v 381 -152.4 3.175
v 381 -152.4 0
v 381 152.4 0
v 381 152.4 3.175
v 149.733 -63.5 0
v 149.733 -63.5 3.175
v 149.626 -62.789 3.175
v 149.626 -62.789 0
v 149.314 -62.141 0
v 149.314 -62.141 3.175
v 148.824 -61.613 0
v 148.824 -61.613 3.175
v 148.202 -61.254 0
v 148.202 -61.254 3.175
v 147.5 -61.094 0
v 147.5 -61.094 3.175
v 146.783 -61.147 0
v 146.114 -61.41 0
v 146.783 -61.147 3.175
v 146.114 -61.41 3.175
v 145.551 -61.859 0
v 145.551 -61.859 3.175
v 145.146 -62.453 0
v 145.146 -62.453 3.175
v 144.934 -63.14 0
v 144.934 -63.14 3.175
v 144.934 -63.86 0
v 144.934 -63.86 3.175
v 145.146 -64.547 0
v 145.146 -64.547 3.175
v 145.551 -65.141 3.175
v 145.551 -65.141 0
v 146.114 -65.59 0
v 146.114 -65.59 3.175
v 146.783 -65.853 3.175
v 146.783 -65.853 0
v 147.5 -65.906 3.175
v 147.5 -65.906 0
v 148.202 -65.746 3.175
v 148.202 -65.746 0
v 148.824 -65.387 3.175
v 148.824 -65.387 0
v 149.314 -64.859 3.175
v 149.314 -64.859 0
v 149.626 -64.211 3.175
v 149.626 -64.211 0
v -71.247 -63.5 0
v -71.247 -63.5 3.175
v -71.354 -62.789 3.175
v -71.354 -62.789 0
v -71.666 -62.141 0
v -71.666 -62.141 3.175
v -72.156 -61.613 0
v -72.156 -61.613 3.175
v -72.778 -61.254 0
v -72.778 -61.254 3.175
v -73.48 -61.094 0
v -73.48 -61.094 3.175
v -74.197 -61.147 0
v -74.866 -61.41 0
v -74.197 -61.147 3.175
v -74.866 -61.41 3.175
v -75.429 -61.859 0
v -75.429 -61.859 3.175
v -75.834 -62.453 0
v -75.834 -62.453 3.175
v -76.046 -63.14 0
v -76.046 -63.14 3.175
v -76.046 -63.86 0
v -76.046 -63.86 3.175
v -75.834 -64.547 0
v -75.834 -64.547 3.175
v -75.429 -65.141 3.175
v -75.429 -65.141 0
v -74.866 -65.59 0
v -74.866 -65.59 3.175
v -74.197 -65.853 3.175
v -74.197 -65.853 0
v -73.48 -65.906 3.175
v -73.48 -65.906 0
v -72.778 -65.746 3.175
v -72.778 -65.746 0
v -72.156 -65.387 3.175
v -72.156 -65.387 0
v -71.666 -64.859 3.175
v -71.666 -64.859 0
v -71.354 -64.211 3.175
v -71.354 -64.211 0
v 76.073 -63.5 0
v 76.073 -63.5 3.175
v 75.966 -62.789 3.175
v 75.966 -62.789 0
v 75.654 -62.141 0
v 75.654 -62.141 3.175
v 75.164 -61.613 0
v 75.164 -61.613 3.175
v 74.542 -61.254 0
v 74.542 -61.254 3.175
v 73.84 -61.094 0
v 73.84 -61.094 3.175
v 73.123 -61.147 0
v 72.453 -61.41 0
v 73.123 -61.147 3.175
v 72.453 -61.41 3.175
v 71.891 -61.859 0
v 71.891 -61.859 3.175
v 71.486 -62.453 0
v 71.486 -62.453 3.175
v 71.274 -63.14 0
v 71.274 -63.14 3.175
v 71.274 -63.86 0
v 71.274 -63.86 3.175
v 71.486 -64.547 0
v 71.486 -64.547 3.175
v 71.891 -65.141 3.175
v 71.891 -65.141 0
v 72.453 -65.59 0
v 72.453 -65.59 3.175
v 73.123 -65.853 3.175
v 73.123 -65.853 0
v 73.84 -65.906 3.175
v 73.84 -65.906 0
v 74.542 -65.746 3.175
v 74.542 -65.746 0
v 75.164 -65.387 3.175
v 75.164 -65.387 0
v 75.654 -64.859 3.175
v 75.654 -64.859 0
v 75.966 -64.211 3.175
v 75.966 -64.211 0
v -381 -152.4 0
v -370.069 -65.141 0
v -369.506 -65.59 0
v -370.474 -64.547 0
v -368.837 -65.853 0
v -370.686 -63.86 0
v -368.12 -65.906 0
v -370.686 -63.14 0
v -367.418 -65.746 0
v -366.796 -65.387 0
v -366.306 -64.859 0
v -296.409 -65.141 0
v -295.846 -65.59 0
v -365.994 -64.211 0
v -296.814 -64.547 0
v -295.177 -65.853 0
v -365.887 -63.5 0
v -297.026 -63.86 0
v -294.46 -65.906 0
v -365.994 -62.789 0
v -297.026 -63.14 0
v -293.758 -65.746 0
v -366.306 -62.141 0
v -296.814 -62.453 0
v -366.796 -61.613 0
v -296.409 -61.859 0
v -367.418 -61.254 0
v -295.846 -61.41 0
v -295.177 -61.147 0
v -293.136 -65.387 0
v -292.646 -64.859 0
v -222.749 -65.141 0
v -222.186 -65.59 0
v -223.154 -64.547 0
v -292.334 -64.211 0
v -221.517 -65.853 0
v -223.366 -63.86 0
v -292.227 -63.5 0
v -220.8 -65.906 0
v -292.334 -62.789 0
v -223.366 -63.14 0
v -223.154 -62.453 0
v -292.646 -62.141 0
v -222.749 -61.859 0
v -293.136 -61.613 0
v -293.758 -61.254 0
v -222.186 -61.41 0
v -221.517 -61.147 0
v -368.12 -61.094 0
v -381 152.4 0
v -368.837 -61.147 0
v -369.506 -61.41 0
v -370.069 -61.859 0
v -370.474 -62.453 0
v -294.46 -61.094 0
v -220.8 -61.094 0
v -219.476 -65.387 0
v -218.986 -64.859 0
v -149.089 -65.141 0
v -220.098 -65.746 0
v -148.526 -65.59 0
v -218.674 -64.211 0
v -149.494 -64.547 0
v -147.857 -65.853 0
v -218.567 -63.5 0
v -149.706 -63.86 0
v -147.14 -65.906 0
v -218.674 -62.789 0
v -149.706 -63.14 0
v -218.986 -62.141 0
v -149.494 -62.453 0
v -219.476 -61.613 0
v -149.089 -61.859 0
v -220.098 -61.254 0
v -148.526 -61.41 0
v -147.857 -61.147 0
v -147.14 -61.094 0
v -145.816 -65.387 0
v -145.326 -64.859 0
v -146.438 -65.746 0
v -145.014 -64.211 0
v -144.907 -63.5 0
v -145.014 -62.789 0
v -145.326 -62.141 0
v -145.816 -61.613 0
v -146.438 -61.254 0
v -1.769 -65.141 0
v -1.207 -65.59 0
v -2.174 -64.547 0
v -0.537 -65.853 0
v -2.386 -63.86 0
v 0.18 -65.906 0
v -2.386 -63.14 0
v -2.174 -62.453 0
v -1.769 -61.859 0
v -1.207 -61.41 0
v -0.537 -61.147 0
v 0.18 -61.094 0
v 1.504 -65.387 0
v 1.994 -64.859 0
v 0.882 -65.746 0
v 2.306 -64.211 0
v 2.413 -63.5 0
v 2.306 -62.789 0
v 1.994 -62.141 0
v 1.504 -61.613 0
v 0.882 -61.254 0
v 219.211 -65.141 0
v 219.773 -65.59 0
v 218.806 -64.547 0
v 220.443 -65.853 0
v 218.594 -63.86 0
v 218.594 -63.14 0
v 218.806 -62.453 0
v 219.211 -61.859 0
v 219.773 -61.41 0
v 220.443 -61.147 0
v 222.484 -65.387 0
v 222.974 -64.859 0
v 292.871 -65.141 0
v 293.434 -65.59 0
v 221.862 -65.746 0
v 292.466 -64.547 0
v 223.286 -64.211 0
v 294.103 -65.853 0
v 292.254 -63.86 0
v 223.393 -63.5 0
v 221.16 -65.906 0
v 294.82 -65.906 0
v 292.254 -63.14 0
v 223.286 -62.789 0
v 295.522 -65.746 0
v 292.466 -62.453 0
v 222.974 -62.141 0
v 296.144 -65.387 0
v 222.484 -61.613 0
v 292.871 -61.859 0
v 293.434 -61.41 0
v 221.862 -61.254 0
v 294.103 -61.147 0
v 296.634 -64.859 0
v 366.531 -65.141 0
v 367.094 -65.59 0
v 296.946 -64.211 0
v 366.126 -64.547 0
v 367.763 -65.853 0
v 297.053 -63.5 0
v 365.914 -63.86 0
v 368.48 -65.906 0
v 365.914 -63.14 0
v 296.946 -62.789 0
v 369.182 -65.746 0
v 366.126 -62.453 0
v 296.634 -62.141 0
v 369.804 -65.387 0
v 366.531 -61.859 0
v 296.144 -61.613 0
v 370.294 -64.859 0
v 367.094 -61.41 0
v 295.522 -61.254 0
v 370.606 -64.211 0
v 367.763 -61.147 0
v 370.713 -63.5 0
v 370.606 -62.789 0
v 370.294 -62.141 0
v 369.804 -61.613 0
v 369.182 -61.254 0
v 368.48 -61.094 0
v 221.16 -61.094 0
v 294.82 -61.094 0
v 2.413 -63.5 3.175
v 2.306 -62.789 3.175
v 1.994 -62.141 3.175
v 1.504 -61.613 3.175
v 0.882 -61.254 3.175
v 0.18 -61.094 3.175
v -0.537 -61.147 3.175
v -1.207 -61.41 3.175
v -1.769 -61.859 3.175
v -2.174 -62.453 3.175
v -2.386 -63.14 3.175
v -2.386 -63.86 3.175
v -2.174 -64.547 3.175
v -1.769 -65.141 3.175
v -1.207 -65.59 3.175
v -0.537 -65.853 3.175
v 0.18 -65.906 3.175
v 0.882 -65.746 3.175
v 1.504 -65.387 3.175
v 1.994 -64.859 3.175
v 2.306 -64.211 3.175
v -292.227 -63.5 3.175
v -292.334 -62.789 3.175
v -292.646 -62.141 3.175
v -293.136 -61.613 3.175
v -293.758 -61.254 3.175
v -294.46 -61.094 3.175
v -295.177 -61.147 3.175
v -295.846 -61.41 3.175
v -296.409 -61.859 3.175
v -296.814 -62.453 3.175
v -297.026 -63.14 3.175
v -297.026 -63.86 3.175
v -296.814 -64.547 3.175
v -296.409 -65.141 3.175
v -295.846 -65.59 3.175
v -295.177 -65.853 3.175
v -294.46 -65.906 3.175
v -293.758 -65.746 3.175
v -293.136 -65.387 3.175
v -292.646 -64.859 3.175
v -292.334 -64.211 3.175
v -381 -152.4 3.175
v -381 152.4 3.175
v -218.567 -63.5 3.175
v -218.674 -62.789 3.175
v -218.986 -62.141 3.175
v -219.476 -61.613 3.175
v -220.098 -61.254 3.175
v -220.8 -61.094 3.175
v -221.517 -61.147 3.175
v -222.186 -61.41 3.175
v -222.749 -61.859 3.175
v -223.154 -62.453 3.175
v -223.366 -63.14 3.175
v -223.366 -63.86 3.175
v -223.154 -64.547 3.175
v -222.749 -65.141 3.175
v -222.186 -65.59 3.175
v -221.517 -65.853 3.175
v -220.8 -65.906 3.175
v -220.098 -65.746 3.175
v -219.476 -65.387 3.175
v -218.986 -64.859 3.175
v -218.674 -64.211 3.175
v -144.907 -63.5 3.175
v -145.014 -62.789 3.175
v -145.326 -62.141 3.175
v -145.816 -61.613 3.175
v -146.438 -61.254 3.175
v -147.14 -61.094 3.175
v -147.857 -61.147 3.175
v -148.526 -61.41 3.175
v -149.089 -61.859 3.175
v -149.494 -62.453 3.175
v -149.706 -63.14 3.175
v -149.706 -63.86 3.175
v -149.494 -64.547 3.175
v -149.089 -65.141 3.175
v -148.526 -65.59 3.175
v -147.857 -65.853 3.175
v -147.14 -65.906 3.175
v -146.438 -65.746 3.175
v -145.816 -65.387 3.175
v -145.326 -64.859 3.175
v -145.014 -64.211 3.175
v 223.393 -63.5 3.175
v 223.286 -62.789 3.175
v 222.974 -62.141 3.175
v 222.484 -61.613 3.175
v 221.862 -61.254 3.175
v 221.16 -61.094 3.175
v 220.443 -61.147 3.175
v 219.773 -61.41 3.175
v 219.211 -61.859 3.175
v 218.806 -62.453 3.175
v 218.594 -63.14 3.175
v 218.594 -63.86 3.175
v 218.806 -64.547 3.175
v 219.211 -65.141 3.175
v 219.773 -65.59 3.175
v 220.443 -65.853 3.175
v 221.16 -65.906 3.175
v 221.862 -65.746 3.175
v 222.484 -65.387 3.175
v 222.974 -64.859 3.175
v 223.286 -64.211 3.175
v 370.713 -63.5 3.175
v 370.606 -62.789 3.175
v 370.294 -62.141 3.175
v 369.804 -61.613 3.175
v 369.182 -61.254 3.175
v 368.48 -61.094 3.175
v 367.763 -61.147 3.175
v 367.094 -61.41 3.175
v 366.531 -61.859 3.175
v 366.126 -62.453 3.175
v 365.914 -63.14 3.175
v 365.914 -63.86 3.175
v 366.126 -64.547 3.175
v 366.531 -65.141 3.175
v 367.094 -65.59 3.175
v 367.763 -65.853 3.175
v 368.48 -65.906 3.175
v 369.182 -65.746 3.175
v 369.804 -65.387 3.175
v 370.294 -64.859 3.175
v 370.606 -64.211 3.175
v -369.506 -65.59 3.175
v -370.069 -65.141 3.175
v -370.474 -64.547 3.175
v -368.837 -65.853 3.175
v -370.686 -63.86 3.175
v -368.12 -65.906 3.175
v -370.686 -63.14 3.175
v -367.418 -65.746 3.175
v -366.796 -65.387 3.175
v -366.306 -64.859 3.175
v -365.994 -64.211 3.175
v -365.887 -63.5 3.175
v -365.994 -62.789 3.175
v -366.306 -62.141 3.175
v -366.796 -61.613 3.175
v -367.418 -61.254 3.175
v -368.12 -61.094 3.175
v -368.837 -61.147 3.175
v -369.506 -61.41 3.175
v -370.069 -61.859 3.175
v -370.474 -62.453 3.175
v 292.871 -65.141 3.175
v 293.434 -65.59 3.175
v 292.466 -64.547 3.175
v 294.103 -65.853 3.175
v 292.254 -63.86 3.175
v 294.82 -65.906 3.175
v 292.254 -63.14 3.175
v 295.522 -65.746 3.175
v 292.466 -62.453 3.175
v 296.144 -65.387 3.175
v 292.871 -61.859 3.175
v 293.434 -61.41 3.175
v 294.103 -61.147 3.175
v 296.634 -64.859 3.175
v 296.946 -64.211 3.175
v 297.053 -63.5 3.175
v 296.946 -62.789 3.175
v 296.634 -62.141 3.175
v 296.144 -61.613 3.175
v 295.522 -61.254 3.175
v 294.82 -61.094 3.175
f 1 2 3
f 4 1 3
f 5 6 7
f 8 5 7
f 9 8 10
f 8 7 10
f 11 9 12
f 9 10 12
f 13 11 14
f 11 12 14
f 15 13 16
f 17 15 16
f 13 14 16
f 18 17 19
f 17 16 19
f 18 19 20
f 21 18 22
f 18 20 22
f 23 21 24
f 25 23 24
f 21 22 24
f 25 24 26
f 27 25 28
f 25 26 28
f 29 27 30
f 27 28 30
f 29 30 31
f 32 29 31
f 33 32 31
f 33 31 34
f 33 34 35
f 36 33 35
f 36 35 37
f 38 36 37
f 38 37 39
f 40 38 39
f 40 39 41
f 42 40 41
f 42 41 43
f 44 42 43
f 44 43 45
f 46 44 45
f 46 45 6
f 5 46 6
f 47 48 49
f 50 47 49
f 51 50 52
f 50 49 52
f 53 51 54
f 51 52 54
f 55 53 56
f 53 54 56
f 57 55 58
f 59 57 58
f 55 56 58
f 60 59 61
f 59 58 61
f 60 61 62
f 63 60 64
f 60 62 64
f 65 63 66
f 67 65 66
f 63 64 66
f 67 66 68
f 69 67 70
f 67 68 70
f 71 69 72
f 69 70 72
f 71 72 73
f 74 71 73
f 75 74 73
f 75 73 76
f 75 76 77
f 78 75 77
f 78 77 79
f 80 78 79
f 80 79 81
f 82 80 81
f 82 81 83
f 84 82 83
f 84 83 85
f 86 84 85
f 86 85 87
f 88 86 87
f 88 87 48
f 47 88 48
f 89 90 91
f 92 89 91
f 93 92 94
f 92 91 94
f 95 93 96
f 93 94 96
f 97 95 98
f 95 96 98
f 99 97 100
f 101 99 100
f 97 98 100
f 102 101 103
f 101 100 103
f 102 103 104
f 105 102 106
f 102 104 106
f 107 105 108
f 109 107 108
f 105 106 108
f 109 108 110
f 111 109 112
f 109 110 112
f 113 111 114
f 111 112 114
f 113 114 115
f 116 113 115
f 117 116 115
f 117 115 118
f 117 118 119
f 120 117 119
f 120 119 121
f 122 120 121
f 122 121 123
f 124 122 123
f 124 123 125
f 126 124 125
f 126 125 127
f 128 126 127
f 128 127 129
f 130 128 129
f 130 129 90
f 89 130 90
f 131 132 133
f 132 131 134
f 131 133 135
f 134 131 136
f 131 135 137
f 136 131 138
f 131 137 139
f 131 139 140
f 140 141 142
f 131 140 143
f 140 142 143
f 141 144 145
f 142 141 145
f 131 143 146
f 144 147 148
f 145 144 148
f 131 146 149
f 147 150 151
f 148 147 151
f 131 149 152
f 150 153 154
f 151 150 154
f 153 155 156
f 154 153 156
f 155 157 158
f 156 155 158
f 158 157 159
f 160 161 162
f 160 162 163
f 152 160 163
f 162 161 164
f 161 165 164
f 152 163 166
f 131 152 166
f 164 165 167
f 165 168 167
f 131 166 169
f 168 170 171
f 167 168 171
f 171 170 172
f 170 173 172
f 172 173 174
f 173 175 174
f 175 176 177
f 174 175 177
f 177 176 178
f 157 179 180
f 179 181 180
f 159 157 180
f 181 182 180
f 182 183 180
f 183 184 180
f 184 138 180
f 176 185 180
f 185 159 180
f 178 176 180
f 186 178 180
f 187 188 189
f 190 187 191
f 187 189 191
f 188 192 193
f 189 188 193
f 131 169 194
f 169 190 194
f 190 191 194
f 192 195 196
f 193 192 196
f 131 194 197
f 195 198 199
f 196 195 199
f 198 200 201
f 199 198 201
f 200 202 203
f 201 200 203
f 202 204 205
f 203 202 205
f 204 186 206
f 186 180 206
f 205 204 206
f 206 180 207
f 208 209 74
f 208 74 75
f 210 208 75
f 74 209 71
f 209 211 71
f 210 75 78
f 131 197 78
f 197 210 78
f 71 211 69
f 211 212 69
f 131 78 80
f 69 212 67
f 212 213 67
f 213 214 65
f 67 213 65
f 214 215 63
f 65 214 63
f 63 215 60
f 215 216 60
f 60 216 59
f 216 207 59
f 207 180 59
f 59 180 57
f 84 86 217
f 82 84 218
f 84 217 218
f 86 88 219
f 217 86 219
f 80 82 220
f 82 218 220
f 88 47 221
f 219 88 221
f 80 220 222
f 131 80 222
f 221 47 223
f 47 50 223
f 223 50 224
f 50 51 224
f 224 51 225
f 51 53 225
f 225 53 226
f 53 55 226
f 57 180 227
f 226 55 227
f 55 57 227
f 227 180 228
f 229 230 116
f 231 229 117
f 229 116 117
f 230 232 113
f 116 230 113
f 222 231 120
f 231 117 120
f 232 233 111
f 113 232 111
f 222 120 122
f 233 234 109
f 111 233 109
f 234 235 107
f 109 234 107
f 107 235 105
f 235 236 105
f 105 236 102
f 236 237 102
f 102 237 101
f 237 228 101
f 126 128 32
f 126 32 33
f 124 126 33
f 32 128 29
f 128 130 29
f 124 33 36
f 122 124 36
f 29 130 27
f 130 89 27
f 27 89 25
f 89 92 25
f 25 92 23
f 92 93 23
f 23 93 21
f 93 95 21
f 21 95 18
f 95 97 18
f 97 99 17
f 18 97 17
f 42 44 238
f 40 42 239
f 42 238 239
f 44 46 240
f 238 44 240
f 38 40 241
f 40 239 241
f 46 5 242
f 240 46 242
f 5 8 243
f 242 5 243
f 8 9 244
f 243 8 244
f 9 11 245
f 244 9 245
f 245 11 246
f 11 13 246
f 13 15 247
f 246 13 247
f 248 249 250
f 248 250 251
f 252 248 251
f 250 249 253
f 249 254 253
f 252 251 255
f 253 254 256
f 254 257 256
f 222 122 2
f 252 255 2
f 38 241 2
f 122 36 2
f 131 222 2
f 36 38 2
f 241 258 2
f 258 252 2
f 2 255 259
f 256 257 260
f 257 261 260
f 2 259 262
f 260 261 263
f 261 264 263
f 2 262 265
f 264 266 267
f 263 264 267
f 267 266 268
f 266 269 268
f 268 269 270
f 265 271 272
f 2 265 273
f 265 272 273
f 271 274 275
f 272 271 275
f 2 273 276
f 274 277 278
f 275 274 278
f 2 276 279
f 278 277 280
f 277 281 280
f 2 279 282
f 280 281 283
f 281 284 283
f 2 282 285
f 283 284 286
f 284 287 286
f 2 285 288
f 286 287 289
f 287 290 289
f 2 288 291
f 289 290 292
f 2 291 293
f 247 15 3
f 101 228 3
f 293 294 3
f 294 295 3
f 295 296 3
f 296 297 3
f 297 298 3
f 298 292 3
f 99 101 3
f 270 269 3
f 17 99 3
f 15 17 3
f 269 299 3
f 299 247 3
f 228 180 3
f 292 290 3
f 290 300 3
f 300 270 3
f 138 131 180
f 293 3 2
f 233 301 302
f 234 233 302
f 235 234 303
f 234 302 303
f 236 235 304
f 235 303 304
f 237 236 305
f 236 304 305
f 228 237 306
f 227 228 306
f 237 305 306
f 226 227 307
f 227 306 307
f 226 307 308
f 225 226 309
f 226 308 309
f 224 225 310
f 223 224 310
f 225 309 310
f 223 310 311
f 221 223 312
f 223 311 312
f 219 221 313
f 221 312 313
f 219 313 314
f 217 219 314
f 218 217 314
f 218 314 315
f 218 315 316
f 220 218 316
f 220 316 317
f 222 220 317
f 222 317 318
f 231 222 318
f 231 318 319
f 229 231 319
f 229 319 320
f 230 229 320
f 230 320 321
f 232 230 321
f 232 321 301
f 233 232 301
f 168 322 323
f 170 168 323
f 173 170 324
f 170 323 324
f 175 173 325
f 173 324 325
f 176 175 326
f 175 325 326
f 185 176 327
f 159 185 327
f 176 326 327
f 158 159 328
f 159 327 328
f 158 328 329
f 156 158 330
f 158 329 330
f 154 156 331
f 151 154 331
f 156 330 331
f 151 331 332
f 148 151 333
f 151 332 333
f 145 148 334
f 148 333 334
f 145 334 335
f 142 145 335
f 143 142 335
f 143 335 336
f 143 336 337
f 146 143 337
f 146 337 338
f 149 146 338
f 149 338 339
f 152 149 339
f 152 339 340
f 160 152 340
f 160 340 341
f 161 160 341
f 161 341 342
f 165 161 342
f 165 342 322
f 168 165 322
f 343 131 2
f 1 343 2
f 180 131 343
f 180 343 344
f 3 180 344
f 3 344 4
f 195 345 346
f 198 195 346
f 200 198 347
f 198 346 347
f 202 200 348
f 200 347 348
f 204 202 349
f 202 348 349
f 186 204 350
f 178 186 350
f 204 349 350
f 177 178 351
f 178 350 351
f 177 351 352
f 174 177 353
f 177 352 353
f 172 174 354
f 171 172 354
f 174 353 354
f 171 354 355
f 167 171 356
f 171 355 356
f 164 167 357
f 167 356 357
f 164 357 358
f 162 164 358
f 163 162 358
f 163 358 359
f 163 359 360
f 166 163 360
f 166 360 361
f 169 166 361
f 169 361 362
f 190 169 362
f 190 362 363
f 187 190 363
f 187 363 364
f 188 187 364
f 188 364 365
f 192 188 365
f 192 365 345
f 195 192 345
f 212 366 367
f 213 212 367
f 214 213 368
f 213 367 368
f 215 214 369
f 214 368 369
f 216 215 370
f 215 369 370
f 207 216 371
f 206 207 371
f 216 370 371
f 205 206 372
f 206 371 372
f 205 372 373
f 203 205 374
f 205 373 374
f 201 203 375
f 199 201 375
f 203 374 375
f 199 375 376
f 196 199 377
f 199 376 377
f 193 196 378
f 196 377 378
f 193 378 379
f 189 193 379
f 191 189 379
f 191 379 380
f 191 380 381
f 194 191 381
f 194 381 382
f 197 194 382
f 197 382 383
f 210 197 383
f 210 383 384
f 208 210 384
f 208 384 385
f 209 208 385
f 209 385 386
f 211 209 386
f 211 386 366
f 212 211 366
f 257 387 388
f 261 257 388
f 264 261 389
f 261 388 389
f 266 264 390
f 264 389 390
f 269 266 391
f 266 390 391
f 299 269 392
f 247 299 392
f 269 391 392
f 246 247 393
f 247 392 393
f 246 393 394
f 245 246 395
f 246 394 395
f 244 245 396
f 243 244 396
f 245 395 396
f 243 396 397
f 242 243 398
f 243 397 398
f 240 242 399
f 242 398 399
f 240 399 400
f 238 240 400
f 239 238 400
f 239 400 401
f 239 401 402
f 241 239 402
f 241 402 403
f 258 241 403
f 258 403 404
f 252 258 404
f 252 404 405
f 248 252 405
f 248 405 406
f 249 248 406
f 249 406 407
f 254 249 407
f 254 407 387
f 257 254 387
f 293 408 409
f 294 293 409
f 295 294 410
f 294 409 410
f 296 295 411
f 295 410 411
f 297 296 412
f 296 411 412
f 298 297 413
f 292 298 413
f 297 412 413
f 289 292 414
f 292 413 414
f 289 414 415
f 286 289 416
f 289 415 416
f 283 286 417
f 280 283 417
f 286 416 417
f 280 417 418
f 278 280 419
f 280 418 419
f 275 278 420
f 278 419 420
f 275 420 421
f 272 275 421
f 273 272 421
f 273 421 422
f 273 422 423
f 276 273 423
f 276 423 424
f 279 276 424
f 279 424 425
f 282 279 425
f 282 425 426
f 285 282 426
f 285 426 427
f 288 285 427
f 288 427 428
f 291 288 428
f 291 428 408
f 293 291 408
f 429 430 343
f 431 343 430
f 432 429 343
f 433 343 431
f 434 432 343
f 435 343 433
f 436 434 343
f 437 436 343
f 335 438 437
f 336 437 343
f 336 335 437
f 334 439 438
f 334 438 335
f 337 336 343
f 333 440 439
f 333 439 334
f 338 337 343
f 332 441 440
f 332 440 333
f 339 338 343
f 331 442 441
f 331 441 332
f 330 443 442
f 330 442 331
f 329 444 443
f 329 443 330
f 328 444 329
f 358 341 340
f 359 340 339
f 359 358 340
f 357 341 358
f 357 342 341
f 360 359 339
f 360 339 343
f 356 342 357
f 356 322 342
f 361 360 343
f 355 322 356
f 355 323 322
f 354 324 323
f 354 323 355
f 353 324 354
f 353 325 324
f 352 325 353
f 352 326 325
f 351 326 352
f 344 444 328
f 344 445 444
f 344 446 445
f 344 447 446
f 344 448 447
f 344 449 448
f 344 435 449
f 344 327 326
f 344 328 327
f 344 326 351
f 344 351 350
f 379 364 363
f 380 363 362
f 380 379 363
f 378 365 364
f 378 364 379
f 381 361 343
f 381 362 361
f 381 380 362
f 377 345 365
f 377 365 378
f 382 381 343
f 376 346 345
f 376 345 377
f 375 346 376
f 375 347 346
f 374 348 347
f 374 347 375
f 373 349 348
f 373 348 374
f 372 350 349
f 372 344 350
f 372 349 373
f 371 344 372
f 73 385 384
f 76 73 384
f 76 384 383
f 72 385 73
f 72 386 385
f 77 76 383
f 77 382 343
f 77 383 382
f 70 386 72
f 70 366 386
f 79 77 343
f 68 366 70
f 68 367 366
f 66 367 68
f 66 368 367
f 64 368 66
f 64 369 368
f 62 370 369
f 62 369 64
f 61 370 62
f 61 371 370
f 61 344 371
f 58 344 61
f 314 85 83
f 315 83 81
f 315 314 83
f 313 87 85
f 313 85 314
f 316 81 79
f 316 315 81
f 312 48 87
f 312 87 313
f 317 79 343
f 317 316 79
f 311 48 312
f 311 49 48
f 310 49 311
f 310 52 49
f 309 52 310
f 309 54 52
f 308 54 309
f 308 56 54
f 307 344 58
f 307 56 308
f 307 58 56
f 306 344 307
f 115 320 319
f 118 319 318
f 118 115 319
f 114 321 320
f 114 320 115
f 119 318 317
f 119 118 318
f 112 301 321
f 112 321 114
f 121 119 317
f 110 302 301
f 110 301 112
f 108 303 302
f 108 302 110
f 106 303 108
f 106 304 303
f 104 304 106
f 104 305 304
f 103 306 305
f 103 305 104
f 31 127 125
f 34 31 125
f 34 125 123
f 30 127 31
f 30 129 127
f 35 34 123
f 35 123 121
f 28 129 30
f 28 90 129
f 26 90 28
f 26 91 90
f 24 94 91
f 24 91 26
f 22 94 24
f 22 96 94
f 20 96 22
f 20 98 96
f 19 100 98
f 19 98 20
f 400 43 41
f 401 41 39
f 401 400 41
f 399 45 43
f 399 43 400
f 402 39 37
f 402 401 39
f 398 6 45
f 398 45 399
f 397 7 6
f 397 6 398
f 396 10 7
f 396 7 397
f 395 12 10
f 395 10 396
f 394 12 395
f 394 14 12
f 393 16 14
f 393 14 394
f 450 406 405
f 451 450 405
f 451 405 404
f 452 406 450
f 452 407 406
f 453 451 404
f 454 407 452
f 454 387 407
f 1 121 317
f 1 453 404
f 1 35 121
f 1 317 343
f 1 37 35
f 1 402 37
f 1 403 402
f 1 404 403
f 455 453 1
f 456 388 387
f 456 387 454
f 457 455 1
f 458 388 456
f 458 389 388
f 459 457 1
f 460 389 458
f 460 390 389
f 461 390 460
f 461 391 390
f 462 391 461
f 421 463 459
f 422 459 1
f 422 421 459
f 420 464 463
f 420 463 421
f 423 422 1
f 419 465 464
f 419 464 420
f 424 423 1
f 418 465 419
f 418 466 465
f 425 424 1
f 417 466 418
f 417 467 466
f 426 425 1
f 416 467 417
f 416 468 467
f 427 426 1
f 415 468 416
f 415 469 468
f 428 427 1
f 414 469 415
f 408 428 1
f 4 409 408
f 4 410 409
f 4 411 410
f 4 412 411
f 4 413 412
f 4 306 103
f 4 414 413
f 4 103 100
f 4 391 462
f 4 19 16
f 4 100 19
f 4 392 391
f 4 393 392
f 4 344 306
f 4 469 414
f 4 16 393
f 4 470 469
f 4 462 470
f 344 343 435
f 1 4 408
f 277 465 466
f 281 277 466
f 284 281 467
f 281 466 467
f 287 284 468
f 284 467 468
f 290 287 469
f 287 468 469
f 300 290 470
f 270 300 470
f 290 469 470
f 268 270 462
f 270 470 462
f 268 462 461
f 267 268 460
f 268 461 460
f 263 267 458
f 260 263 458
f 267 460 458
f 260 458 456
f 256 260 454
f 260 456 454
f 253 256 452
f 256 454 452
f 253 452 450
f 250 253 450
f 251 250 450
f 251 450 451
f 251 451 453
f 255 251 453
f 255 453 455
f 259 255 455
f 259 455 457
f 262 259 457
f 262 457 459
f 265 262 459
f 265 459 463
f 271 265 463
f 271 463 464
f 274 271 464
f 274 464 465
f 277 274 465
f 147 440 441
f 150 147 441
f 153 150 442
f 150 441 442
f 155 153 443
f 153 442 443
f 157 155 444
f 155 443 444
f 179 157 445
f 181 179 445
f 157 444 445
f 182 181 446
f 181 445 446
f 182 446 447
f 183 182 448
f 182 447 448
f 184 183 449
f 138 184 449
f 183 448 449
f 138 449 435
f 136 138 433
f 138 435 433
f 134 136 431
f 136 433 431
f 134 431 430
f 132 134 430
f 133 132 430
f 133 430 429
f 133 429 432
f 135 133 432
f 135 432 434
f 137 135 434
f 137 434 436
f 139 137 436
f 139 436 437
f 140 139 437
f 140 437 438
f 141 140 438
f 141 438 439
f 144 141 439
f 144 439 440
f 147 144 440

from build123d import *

# Parameters (mm, degrees)
SKETCH1_W           = 762
SKETCH1_H           = 304.8
BOSS_EXTRUDE1_DEPTH = 3.175
SKETCH2_R           = 2.413
CUT_EXTRUDE1_DEPTH  = 411.361841093


with BuildPart() as part:
    # Sketch1 → Boss-Extrude1 (new body)
    with BuildSketch(Plane.XY):
        Rectangle(SKETCH1_W, SKETCH1_H)
    extrude(amount=BOSS_EXTRUDE1_DEPTH)

    # Sketch2 → Cut-Extrude1 (cut, through all)
    with BuildSketch(Plane.XY.offset(3.175)):
        with Locations((-368.3, -63.5)):
            Circle(SKETCH2_R)
        with Locations((-294.64, -63.5)):
            Circle(SKETCH2_R)
        with Locations((-220.98, -63.5)):
            Circle(SKETCH2_R)
        with Locations((-147.32, -63.5)):
            Circle(SKETCH2_R)
        with Locations((-73.66, -63.5)):
            Circle(SKETCH2_R)
        with Locations((0, -63.5)):
            Circle(SKETCH2_R)
        with Locations((73.66, -63.5)):
            Circle(SKETCH2_R)
        with Locations((147.32, -63.5)):
            Circle(SKETCH2_R)
        with Locations((220.98, -63.5)):
            Circle(SKETCH2_R)
        with Locations((294.64, -63.5)):
            Circle(SKETCH2_R)
        with Locations((368.3, -63.5)):
            Circle(SKETCH2_R)
    extrude(amount=-CUT_EXTRUDE1_DEPTH, mode=Mode.SUBTRACT)


solid = part.part
